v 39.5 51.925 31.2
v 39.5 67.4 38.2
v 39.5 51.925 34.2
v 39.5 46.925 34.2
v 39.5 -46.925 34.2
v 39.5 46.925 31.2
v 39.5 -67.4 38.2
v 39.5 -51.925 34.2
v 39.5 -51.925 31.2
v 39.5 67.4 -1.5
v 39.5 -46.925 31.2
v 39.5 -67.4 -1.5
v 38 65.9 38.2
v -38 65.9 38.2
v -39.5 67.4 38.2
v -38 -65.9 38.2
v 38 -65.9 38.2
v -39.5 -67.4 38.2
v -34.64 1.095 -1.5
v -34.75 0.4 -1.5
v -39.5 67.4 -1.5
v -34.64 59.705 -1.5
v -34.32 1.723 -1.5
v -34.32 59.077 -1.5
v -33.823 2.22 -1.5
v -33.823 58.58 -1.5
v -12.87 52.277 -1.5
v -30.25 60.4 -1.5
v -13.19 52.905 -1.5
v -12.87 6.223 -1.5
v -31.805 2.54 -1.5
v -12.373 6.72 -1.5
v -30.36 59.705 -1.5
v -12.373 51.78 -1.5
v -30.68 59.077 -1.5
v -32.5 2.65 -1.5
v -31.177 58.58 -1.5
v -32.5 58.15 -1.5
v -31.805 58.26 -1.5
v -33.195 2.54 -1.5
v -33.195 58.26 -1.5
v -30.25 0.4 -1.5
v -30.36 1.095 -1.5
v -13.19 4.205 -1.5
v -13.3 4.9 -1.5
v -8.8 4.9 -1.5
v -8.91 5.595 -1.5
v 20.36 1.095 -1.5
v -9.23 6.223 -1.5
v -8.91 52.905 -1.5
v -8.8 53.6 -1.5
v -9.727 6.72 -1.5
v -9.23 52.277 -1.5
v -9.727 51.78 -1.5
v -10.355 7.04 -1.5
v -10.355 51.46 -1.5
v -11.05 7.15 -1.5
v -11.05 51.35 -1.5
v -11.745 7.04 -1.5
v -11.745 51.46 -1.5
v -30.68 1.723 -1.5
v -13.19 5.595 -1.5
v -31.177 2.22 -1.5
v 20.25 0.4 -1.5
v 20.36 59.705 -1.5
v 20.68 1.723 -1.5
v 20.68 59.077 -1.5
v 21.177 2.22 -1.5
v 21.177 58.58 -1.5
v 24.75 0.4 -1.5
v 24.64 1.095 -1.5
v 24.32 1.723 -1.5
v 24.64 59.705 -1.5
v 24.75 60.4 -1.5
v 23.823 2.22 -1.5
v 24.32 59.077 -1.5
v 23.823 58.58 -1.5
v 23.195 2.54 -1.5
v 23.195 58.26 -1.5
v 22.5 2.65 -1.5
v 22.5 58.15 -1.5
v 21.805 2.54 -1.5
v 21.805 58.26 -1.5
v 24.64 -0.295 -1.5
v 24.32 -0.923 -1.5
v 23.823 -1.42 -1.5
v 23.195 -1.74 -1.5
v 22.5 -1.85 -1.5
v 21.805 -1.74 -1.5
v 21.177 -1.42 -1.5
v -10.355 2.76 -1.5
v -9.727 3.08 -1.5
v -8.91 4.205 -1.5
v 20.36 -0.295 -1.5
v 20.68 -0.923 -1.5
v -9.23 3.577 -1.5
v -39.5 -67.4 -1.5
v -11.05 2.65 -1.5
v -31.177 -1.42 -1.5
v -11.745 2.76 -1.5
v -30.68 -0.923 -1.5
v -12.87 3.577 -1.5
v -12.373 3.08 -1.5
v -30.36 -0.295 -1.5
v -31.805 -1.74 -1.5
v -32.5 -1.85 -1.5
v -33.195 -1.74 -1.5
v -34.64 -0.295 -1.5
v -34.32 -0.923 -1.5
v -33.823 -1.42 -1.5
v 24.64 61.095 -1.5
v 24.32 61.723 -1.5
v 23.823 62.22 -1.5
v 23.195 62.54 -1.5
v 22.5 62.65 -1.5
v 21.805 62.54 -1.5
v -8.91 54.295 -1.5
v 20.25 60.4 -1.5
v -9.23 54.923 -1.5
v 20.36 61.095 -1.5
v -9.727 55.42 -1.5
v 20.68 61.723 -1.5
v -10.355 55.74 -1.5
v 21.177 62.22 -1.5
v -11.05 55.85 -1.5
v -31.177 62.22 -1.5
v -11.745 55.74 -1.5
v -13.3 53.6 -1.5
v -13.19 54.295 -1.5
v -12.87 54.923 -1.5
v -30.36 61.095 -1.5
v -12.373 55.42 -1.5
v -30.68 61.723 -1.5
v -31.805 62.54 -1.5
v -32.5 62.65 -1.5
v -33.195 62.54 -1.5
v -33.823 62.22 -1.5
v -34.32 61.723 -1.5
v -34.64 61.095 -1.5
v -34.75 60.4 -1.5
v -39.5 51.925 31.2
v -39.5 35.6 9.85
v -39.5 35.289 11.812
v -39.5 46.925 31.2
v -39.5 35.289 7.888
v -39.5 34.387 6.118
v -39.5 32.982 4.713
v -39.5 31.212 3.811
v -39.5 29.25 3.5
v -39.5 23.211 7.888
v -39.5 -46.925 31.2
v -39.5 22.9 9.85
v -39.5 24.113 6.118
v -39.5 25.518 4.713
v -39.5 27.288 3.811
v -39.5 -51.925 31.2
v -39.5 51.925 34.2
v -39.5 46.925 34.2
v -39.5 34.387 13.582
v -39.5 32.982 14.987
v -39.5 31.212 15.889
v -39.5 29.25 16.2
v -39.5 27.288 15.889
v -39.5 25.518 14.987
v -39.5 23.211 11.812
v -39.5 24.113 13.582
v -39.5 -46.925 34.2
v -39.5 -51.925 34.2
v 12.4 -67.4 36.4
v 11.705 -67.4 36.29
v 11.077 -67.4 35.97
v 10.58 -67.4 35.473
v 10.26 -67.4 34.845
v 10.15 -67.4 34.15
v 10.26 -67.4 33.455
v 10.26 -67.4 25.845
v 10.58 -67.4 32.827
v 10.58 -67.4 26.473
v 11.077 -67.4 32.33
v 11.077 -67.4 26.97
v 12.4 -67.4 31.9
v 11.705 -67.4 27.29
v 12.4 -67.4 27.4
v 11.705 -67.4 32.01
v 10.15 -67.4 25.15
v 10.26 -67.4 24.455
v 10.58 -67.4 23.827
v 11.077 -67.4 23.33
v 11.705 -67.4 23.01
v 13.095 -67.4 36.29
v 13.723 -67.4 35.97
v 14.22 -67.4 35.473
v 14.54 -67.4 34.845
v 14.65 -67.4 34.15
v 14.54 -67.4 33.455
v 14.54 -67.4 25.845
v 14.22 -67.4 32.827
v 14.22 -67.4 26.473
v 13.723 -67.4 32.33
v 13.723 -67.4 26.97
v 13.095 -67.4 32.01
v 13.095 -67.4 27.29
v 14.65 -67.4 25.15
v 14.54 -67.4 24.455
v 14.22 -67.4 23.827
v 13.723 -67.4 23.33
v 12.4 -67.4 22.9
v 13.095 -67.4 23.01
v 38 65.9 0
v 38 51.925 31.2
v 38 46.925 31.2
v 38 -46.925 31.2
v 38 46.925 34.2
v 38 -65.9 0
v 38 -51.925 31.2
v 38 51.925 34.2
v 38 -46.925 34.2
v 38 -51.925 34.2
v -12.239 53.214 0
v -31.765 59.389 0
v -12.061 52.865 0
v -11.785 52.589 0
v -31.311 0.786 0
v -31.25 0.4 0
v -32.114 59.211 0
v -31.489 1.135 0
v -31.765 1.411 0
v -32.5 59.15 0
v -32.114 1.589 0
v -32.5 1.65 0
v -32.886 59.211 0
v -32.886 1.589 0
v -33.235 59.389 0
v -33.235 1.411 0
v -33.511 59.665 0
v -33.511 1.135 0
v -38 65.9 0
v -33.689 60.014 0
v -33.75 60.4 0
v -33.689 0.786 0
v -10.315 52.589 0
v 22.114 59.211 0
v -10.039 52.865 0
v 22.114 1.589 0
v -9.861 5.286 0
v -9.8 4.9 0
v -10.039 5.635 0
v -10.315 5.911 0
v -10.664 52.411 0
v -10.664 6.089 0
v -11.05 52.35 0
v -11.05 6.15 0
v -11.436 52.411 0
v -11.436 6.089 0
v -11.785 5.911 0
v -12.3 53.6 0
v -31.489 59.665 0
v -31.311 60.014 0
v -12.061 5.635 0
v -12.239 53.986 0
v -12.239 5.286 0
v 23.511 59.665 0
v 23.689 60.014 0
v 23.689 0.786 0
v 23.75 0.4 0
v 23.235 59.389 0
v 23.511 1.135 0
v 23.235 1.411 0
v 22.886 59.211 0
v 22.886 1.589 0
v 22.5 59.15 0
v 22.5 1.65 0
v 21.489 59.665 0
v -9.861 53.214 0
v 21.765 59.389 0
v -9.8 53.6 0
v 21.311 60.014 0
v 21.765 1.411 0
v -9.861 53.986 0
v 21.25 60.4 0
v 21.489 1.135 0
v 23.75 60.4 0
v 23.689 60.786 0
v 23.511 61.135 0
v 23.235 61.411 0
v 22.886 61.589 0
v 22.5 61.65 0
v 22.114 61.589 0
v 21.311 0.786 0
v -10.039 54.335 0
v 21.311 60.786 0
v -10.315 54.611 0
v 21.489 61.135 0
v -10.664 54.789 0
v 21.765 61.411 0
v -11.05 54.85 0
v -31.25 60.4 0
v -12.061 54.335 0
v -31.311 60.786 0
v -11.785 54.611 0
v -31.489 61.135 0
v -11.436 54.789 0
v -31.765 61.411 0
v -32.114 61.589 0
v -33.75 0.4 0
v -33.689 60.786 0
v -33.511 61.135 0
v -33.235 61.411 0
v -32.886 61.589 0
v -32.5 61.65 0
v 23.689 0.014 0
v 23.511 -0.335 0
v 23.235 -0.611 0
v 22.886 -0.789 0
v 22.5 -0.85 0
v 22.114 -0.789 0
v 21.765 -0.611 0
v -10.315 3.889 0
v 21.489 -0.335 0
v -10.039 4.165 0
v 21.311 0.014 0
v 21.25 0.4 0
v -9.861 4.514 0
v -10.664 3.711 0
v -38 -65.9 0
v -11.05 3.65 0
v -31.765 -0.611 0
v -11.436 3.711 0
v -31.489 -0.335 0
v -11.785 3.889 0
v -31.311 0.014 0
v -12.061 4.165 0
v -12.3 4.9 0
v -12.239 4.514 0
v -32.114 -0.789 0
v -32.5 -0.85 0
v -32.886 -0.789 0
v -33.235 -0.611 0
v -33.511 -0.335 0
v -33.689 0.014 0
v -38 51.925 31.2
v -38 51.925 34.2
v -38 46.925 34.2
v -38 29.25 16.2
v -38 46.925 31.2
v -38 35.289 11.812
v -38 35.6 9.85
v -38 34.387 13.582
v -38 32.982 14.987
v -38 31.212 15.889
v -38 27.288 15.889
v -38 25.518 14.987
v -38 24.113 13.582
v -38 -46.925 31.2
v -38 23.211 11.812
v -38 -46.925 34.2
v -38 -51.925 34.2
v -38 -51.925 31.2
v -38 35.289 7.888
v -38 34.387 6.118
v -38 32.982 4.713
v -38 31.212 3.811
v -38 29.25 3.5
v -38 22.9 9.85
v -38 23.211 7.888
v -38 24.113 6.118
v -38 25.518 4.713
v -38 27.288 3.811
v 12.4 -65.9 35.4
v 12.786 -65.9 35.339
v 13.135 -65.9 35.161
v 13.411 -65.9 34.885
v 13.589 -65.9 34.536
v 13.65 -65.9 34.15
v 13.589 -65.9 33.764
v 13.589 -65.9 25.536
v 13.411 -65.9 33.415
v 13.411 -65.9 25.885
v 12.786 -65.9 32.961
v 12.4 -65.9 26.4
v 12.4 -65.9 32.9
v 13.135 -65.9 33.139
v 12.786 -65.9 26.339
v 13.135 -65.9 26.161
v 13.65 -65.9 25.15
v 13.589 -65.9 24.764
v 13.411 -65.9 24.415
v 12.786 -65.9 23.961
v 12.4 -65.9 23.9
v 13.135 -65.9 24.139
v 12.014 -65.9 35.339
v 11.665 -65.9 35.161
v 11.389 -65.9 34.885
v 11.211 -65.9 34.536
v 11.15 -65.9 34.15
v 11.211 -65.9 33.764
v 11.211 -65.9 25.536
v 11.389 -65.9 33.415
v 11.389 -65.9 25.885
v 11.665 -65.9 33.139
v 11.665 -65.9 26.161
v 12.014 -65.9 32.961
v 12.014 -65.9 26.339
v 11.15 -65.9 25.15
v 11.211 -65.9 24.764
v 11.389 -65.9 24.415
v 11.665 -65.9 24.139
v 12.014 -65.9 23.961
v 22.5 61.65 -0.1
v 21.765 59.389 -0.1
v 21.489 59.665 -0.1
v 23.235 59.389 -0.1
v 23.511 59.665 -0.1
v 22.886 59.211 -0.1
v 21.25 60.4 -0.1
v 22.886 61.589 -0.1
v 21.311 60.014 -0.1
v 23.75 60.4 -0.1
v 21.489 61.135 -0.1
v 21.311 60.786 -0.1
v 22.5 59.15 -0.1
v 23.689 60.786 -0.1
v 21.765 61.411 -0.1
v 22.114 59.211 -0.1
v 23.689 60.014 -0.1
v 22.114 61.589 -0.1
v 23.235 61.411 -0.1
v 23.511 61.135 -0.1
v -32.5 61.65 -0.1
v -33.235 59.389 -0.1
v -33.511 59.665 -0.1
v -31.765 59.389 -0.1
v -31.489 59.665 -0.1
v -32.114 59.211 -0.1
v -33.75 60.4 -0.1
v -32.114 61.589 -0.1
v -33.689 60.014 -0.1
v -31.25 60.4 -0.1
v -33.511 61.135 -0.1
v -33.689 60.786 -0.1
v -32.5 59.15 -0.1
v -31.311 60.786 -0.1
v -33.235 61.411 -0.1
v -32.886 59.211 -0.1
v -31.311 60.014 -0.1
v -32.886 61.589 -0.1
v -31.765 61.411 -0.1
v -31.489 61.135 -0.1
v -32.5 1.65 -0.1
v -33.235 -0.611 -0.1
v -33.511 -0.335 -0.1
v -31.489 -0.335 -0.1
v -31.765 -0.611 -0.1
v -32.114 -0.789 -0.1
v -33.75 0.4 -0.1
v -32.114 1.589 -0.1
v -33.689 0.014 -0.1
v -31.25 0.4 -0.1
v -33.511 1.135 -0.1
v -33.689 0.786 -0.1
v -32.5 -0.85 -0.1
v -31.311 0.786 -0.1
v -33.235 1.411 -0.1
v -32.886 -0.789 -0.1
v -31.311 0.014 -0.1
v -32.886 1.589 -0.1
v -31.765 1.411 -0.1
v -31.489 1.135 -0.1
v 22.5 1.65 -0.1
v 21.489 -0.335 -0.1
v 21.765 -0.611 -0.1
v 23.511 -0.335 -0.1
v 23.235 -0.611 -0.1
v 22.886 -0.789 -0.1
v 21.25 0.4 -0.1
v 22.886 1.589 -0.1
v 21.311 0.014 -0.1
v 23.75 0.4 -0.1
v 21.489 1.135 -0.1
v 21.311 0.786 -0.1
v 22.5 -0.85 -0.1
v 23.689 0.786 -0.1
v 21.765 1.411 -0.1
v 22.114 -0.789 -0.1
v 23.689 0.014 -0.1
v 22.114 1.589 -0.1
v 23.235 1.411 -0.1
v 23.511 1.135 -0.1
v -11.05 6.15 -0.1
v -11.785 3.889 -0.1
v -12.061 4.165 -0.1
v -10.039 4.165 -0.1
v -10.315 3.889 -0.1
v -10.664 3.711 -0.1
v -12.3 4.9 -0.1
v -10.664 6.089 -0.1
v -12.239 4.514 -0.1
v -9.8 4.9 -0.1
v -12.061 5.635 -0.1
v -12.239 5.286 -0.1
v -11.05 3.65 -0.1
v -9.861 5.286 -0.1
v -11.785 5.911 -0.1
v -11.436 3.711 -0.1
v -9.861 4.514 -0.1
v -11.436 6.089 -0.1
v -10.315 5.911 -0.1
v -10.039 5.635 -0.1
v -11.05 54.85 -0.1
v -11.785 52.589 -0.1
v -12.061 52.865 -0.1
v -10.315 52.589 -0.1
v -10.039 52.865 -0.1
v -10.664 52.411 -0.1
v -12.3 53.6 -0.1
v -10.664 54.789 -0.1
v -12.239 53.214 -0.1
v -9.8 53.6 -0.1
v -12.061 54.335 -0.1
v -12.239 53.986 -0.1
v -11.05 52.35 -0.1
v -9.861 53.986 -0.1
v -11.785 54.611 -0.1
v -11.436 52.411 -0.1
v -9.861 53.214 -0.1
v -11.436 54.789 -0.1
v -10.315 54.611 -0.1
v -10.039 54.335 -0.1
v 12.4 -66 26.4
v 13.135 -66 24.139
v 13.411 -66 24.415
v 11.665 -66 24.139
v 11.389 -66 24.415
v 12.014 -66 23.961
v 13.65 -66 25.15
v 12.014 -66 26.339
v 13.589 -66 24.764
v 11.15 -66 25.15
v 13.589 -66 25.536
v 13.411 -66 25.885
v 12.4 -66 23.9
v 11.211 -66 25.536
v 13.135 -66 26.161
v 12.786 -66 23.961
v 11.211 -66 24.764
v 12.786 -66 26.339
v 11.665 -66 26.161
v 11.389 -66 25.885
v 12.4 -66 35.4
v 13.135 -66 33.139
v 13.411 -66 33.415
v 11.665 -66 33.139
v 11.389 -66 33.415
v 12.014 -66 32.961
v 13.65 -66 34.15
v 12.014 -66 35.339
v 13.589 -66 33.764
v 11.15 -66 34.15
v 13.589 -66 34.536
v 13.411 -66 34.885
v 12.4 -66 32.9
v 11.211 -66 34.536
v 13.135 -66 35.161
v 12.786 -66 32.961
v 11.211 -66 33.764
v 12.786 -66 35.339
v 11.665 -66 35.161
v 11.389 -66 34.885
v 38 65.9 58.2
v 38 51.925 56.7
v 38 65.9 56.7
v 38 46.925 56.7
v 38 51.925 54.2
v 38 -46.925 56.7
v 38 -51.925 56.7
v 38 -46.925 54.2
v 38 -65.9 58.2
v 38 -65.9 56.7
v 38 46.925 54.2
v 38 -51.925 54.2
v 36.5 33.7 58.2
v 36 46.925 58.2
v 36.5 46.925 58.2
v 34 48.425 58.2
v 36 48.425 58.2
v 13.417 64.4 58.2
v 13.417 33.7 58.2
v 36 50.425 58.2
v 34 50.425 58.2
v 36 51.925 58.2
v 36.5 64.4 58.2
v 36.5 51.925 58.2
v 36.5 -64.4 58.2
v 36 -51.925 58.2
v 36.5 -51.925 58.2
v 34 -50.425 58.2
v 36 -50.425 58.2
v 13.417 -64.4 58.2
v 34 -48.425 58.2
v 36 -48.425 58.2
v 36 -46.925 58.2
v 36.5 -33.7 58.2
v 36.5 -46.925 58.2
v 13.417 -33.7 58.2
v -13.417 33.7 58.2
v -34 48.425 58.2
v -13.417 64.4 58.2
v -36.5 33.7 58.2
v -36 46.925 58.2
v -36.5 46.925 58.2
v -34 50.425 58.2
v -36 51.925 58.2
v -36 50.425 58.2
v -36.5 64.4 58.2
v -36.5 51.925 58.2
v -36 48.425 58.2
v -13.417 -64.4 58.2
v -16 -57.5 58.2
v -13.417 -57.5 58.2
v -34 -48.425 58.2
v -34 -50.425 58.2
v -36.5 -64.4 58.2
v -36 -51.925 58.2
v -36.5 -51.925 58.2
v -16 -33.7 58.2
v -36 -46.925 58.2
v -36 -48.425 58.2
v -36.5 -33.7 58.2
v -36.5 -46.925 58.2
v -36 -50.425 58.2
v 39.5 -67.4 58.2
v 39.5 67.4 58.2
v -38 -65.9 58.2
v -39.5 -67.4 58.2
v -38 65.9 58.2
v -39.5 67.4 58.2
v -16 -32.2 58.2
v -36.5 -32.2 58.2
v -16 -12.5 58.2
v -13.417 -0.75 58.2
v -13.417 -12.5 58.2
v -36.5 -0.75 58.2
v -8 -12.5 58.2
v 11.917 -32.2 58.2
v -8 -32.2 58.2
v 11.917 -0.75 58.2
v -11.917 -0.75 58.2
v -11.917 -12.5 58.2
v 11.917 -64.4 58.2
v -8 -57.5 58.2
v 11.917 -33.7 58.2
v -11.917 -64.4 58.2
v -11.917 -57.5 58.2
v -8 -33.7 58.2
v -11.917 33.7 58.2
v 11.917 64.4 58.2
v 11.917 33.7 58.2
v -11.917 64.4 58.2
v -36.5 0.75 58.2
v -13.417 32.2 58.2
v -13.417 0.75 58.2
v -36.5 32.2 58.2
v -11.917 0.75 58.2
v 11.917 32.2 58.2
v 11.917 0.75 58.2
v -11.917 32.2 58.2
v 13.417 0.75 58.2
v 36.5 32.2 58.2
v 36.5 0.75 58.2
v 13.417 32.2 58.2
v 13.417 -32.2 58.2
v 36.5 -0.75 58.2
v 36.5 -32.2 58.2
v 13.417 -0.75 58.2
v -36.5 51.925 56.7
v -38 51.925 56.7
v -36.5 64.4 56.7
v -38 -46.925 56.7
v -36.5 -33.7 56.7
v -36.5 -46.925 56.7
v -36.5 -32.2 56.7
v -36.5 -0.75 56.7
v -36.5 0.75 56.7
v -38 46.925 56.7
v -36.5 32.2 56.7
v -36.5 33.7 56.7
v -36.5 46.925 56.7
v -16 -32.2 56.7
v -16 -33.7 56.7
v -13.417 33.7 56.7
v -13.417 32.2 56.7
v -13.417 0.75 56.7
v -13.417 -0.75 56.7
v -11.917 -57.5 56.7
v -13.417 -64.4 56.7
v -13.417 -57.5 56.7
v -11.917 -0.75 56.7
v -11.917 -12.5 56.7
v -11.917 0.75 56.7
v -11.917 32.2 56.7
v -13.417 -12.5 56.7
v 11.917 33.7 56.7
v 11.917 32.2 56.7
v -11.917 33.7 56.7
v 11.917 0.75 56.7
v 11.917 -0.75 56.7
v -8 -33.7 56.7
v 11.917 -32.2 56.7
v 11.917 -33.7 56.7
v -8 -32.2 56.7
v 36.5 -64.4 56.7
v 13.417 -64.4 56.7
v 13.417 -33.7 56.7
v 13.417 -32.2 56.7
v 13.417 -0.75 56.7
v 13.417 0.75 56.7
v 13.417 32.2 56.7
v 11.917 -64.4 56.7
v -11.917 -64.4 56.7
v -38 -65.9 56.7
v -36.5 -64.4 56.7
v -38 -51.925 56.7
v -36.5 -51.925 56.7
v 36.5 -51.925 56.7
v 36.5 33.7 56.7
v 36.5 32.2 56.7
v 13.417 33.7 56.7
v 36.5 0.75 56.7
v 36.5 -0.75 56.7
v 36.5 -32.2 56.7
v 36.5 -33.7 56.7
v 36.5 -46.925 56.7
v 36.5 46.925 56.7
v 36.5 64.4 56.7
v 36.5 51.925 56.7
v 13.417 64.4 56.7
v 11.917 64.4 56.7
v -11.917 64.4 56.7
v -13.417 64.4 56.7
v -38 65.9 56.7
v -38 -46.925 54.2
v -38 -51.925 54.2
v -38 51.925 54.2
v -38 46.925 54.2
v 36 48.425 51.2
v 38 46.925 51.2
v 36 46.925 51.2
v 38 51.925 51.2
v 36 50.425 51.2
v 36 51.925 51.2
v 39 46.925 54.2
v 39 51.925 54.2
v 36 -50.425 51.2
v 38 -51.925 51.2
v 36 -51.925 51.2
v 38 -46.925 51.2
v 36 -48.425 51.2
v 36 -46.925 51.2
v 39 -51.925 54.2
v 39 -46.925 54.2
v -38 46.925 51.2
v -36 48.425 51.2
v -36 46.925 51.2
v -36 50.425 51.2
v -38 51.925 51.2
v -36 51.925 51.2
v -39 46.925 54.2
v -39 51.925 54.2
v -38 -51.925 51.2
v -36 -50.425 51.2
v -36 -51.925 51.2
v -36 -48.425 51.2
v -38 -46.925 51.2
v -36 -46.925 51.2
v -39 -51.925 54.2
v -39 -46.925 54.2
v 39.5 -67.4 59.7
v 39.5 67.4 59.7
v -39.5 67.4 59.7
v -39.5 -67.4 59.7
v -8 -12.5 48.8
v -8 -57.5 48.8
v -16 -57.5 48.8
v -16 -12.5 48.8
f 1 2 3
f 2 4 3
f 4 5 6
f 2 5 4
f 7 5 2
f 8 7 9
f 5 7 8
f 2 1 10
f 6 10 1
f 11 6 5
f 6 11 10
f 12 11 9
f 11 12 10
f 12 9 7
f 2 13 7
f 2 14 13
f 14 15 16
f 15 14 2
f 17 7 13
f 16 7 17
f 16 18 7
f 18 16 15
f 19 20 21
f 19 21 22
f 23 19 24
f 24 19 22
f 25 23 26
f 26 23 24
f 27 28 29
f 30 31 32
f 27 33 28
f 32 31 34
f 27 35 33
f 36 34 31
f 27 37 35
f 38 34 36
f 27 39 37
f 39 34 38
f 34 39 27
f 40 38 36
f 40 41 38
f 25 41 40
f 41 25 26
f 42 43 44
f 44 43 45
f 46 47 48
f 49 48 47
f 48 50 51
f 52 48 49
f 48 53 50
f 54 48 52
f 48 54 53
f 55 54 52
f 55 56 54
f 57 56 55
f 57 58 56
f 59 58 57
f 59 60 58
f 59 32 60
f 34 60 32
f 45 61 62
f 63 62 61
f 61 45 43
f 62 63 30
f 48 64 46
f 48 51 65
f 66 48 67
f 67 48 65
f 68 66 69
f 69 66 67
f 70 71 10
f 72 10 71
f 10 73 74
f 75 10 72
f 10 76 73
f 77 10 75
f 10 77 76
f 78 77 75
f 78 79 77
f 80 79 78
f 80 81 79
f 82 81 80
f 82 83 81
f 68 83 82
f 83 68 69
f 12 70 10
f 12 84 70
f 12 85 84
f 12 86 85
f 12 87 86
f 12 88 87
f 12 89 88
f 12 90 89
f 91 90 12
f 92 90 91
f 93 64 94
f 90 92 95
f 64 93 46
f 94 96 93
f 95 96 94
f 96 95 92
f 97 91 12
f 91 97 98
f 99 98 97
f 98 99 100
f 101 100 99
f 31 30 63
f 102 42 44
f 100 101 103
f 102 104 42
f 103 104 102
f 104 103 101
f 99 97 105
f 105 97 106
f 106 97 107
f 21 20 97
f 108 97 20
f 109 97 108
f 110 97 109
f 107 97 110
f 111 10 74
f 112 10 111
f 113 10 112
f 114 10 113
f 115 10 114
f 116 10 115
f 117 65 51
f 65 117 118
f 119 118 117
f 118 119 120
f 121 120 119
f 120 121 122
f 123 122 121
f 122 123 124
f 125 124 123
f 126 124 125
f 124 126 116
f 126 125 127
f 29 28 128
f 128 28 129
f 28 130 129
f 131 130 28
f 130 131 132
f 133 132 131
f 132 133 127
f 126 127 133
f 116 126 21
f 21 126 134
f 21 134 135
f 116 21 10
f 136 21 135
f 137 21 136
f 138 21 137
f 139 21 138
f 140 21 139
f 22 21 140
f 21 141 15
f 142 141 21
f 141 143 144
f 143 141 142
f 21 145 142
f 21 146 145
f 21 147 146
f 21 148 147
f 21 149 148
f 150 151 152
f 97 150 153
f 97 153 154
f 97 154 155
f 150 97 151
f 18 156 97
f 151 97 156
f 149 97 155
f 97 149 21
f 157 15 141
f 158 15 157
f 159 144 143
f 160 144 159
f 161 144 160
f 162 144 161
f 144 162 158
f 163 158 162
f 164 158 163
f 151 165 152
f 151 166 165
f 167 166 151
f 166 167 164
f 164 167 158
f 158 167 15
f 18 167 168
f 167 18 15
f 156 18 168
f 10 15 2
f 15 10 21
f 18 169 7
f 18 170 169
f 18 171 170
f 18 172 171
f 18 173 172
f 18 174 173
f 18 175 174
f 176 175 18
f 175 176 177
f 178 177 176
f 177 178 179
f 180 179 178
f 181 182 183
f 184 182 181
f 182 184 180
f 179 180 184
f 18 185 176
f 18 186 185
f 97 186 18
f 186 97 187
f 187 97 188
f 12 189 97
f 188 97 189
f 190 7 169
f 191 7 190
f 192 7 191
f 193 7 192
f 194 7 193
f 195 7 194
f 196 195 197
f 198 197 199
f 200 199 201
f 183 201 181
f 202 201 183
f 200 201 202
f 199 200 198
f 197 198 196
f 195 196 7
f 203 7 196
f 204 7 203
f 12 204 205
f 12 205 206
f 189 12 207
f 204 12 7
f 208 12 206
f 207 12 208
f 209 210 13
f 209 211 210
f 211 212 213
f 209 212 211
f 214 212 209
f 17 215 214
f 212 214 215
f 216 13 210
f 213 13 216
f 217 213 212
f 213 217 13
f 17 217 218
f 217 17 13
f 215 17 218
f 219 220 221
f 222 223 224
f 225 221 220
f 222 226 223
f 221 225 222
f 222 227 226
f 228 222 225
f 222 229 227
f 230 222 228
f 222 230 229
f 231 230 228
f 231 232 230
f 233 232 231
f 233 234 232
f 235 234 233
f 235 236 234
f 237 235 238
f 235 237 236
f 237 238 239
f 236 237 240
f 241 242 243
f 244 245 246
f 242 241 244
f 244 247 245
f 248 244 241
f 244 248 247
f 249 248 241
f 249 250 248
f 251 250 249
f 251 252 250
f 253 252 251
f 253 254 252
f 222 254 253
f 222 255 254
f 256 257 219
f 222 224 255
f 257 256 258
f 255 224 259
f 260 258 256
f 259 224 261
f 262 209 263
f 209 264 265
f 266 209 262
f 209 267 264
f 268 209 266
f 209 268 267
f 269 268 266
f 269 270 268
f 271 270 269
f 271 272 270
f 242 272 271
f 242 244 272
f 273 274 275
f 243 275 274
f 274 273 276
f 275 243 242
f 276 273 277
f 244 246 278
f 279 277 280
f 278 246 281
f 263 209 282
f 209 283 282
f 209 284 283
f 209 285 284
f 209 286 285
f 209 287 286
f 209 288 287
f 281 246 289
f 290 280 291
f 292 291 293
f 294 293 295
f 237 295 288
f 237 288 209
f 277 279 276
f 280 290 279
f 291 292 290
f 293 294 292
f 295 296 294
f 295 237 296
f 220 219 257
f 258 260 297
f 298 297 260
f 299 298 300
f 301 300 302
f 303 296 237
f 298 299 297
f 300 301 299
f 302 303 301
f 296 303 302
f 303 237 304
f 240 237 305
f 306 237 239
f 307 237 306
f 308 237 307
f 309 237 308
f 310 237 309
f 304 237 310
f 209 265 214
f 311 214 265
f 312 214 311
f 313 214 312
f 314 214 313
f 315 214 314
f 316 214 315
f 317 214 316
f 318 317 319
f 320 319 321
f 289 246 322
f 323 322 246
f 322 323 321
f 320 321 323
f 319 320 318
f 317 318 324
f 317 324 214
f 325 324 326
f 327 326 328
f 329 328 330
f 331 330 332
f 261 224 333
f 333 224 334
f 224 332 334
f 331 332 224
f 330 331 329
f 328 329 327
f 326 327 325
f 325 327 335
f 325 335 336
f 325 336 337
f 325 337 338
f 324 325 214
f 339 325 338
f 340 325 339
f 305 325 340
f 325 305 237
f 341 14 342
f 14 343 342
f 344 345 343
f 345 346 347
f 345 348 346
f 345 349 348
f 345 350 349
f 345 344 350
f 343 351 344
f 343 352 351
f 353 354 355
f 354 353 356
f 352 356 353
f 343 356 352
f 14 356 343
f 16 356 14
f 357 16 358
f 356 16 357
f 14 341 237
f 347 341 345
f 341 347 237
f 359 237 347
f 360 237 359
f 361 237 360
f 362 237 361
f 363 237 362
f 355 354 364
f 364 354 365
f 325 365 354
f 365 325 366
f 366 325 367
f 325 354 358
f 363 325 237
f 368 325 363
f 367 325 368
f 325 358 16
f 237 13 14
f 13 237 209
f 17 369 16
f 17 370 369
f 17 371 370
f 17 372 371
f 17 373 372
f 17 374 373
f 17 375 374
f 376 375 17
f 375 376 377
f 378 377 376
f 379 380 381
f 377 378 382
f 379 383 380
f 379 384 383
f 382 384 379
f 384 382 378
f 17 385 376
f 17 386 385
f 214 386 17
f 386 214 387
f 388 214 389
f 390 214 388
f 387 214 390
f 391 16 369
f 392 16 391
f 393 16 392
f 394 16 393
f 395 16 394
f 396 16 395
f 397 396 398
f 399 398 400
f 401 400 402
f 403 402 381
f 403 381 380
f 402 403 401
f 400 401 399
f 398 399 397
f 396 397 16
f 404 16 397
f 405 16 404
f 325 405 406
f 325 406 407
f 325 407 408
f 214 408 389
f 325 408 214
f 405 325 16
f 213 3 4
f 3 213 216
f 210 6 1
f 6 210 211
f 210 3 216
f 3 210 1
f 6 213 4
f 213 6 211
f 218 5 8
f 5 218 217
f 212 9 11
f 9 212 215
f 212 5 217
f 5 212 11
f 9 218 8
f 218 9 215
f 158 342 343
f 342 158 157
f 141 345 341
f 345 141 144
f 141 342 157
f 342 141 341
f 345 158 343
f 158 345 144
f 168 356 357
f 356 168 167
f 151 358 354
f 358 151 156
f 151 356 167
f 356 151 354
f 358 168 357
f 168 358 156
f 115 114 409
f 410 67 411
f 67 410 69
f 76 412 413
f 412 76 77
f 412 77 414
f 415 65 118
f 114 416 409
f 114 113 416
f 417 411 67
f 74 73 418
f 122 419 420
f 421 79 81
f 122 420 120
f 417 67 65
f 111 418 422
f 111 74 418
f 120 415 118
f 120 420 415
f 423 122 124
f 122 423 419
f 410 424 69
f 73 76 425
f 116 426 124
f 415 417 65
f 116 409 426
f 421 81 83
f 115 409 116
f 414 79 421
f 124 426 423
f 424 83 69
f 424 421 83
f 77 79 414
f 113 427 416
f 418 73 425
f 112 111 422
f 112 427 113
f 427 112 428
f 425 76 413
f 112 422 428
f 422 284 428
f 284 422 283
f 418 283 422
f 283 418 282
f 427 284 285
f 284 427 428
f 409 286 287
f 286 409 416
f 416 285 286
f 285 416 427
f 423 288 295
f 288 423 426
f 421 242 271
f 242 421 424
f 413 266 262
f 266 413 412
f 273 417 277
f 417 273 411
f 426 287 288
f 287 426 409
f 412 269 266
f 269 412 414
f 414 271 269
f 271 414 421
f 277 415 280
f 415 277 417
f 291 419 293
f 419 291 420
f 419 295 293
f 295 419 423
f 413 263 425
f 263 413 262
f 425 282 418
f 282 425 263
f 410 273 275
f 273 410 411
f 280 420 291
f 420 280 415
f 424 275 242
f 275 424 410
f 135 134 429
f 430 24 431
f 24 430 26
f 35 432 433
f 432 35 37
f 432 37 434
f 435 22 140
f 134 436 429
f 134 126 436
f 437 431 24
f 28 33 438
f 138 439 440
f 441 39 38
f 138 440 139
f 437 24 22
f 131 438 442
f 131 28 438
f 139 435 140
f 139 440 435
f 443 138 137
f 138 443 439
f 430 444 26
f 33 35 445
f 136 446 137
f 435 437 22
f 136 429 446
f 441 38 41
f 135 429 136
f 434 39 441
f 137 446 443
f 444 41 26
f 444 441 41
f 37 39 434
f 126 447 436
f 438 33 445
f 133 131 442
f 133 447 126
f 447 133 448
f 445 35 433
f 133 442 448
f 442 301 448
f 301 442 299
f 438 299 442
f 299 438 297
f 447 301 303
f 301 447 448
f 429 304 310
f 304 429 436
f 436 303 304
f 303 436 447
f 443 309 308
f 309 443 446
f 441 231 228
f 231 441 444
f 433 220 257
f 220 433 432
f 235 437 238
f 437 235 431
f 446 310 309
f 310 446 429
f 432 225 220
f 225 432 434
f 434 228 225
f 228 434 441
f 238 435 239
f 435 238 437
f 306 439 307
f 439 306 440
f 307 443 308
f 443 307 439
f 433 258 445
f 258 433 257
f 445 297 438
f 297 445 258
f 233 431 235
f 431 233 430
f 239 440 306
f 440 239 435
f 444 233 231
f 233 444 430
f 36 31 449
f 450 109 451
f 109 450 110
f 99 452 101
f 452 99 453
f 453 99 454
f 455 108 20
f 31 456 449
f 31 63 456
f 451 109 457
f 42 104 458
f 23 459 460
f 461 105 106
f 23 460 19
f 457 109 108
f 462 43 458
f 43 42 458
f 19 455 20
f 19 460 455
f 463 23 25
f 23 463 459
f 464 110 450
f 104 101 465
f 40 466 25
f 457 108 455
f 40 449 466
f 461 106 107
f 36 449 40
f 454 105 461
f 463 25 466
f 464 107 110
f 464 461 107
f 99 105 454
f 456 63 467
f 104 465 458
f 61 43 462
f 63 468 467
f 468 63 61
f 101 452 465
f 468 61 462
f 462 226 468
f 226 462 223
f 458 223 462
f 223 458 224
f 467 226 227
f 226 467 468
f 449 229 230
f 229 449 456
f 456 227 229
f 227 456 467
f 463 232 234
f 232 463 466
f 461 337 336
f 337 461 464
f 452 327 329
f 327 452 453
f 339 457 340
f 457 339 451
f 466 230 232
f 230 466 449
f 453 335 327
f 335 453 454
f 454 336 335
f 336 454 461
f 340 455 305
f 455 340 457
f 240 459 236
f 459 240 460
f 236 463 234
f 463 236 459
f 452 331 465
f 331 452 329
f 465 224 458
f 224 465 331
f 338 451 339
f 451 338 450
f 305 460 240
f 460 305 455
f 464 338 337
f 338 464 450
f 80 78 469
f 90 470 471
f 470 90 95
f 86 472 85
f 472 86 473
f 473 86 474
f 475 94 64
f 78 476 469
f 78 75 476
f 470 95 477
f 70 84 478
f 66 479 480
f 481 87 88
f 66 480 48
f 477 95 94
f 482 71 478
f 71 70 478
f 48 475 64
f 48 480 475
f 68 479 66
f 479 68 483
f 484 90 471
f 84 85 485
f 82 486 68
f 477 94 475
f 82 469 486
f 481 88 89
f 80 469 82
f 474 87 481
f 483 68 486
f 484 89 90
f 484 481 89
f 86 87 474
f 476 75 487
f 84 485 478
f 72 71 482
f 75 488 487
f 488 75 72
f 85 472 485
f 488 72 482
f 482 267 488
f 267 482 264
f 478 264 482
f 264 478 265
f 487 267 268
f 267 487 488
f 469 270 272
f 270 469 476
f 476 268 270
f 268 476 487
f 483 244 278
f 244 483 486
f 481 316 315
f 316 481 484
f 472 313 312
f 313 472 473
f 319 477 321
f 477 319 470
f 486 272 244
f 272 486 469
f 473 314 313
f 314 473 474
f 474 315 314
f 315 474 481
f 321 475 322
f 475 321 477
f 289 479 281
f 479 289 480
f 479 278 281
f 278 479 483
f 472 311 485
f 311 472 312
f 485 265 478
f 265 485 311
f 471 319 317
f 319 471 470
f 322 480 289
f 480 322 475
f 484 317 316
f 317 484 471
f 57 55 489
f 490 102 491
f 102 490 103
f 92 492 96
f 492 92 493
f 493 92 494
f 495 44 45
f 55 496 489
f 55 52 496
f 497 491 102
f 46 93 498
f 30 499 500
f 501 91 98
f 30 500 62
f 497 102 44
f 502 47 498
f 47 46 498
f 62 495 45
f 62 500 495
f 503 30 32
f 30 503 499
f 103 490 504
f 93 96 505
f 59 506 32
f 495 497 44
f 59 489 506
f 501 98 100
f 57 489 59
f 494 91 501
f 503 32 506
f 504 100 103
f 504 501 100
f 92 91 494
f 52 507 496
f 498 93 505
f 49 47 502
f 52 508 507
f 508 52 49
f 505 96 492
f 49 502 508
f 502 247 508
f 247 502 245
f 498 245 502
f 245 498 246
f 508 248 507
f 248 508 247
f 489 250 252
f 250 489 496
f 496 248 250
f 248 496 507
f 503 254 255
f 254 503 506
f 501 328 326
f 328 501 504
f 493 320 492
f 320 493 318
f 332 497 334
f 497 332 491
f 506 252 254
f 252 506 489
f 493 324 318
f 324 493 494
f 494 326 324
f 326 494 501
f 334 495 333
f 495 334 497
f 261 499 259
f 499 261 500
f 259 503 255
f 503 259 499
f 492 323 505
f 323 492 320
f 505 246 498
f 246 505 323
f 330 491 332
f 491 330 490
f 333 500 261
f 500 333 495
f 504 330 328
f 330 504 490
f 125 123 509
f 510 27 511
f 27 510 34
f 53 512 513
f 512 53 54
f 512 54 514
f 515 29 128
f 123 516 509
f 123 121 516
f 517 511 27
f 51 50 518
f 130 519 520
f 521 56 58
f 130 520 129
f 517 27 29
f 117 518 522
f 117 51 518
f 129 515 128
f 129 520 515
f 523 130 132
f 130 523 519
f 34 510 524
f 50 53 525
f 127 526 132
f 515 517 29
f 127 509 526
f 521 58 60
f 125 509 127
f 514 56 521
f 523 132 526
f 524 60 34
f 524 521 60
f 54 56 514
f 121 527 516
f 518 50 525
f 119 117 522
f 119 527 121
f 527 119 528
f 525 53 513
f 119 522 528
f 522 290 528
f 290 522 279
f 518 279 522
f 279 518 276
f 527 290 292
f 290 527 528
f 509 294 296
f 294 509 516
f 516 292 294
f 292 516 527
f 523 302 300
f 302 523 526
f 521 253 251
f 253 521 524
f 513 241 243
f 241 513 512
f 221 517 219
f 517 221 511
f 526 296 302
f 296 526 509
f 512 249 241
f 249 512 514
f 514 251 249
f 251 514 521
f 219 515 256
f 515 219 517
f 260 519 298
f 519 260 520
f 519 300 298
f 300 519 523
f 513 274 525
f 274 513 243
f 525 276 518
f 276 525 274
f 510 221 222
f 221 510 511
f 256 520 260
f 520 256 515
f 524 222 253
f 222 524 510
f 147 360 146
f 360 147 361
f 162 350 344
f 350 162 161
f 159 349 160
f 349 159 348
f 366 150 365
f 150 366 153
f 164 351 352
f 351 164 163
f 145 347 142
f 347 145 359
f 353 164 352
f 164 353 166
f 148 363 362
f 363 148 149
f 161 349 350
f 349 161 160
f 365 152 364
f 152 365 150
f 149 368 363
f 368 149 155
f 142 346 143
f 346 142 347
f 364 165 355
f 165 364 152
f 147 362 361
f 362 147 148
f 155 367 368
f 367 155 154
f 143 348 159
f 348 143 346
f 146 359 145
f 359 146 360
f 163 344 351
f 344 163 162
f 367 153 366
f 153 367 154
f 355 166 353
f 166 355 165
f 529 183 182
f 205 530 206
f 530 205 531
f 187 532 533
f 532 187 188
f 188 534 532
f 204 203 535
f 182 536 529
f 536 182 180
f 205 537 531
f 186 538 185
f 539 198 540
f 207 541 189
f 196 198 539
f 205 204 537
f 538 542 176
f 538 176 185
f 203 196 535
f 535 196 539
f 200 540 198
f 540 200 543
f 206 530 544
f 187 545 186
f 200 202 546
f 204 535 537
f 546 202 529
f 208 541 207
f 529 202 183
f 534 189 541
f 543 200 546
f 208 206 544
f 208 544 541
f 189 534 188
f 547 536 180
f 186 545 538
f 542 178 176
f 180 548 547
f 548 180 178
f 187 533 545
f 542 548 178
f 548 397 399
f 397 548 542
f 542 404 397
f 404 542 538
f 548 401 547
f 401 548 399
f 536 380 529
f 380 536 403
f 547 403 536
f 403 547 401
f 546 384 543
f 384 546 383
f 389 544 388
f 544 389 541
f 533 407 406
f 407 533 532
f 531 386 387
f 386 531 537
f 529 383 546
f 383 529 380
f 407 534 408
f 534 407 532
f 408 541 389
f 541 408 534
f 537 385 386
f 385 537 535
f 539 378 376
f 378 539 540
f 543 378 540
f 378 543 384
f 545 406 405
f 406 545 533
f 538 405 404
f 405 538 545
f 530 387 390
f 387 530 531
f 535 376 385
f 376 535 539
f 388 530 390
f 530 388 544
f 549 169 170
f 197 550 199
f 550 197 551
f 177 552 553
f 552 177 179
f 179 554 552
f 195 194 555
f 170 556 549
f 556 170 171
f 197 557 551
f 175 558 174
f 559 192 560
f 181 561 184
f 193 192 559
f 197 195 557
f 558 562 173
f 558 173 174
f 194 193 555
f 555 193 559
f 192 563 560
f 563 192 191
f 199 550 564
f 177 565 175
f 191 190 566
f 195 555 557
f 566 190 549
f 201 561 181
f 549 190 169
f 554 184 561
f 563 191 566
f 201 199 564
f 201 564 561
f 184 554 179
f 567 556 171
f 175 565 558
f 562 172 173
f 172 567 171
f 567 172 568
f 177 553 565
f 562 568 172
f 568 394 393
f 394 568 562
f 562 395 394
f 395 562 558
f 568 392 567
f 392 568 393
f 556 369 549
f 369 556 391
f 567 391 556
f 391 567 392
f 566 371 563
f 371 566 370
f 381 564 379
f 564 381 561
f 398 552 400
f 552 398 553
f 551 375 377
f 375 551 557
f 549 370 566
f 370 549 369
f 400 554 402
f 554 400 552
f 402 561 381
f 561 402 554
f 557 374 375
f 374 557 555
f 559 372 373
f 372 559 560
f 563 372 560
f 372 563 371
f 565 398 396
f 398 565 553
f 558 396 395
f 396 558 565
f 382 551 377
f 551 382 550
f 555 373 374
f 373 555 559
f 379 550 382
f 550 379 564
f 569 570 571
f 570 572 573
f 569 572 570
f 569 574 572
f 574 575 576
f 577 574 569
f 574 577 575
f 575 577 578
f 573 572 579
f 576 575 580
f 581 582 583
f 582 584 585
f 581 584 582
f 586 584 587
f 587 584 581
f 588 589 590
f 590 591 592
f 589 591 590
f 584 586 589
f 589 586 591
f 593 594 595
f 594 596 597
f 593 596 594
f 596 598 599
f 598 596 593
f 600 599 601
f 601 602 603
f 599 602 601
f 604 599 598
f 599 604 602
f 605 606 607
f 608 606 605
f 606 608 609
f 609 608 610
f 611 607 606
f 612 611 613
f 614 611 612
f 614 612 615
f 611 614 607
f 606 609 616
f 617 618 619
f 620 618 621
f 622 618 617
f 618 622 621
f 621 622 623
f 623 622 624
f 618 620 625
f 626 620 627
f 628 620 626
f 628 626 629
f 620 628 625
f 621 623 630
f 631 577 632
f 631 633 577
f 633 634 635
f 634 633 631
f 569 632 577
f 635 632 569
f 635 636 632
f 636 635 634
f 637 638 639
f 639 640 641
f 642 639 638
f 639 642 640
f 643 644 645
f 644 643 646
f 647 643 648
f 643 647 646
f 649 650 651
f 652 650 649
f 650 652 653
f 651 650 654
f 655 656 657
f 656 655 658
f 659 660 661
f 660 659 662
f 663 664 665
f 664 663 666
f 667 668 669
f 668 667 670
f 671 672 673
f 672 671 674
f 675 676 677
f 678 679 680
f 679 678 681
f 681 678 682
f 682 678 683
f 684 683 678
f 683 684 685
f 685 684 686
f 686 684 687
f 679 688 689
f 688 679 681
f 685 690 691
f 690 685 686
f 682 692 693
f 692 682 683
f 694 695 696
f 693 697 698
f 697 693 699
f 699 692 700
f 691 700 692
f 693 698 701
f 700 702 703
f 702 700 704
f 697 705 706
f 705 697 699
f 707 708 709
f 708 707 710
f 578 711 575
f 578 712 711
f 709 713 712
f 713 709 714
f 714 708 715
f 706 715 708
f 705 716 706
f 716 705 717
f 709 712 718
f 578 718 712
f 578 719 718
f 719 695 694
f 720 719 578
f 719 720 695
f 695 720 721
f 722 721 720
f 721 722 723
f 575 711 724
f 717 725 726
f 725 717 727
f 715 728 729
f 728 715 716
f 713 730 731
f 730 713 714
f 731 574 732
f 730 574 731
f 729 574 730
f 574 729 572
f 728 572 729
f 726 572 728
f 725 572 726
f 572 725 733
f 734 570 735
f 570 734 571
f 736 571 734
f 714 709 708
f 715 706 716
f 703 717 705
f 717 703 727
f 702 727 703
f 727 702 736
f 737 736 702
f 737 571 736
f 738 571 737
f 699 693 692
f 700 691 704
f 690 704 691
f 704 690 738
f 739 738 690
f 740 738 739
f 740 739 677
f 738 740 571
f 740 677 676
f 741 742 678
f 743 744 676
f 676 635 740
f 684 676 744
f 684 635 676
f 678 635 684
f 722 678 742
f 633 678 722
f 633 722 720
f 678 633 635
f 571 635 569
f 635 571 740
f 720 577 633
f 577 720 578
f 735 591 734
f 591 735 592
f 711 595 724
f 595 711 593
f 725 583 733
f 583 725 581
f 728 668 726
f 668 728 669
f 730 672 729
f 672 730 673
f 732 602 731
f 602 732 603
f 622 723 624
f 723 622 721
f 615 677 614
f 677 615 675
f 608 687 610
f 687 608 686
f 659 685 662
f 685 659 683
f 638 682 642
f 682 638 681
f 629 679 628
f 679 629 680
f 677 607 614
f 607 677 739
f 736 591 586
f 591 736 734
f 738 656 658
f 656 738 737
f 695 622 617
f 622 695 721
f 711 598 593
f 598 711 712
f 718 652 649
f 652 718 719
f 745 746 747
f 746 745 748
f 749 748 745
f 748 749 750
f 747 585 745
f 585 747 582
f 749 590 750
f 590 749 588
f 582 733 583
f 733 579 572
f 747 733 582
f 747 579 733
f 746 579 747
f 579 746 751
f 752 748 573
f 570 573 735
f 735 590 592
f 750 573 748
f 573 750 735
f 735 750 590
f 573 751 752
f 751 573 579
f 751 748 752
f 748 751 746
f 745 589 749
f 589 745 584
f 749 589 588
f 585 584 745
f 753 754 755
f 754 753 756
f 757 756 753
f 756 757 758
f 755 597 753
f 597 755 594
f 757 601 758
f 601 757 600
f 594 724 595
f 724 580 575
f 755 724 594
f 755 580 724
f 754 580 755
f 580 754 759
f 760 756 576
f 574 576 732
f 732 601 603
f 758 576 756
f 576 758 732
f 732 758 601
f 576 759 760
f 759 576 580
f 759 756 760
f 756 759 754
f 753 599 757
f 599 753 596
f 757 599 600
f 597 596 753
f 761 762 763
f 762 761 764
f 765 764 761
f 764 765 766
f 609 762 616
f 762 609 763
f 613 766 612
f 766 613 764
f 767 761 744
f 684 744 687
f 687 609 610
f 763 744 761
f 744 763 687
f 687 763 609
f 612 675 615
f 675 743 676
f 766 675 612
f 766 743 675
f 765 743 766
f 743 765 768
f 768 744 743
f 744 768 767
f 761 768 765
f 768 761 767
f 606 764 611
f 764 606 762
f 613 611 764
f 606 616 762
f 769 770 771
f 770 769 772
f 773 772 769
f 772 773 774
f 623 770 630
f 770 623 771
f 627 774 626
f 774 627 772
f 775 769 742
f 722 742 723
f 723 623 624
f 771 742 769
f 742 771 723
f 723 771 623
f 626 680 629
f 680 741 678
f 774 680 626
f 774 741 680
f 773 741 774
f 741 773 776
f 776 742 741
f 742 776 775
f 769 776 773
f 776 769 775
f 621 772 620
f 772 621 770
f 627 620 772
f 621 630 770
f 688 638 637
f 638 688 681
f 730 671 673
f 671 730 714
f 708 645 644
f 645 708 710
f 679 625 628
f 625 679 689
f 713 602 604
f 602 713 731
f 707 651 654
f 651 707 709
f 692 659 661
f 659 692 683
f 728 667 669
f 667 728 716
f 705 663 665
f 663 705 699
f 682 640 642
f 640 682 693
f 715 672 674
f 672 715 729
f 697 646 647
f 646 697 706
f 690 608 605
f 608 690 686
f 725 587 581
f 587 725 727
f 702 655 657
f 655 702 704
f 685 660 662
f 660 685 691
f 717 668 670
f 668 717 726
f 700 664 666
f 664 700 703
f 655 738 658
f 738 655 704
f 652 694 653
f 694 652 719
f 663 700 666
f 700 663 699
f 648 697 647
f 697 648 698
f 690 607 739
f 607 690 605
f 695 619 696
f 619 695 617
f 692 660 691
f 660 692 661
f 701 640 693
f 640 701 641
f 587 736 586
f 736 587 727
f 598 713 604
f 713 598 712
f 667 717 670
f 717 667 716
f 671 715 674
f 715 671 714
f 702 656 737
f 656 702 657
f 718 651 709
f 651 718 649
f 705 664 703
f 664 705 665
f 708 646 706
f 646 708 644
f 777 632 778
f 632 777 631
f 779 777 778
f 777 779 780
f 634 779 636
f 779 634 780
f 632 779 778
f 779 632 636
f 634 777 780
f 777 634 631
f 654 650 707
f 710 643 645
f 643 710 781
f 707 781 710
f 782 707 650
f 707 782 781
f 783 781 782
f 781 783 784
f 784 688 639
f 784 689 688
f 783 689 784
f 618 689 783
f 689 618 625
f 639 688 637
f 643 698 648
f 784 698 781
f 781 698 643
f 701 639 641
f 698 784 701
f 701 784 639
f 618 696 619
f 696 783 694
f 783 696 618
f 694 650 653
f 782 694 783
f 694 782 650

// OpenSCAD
// CAD script for the case and lid of the OpenWindow enclosure

// Dimensions of the items contained within the enclosure
// OpenWindow PCB
pcb_length = 65;
pcb_width = 70;
pcb_height = 1;
pcb_hole_diameter = 2.5;
pcb_hole_inset = 5;
// Incoming connections terminal block
terminalblock_length = 23.4;
terminalblock_width = 67.7;
terminalblock_height = 16.2;
terminalblock_hole_diameter = 3.5;
terminalblock_hole_inset = 9.5;
// Relays
relays_length = 52.9;
relays_width = 60.8;
relays_height = 30.8;
// Current measurement PCB
current_pcb_length = 31.5;
current_pcb_width = 13.1;
current_pcb_height = 1;
current_pcb_hole_offset_length = 17;
current_pcb_hole_offset_width = 2.9/2 + 0.6;
current_pcb_hole_diameter = 2.5;

// Main box dimensions
pcb_standoff_height = terminalblock_height + 2;
box_contents_padding = 0.5;
box_length = pcb_length + 2 * box_contents_padding + 10;
box_width = pcb_width +relays_width + 2*box_contents_padding;
box_height = 20 + pcb_standoff_height;
box_wall_thickness = 1.5;

// Relay support block on the box lid
box_lid_relay_support_length = 8;
box_lid_relay_support_width = 45;
box_lid_relay_support_height = box_height - relays_height + 2;
box_lid_relay_support_offset = 22;

// Cable entry grommet dimensions
grommet_diameter = 12.7;
grommet_height = grommet_diameter/2 + 5;

// Lid cantilever clip dimensions
clip_length = 7;
clip_hook_length = 3;
clip_thickness = 2;
clip_width = 5;
clip_spine_width = 2;
clip_spine_depth = 2;
clip_depth = 1;

// This module generates its children in the positions of the main PCB mounting holes
module pcb_holes(){
    pcb_hole_locations = [[pcb_length / 2 - pcb_hole_inset, pcb_width / 2 - pcb_hole_inset, 0],
               [-(pcb_length / 2 - pcb_hole_inset), pcb_width / 2 - pcb_hole_inset, 0],
               [-(pcb_length / 2 - pcb_hole_inset), -(pcb_width / 2 - pcb_hole_inset), 0],
               [pcb_length / 2 - pcb_hole_inset, -(pcb_width / 2 - pcb_hole_inset), 0]];
    
    for(i=pcb_hole_locations){
        translate(i){
            children();
        }
    }
    
}

// This module approximates the main PCB, for testing fit in the box
module pcb(show_board = true){
    union(){
        difference(){
            cube([pcb_length, pcb_width, pcb_height], center=true);
            pcb_holes(){
                cylinder(d = pcb_hole_diameter, h = pcb_height * 3, center=true, $fn=10);
            }
        }
    }
}

// This module generates its children in the positions of the current measurement PCB mounting holes
module current_pcb_holes(){
    for(i = [-current_pcb_width/2 + current_pcb_hole_offset_width, current_pcb_width/2 - current_pcb_hole_offset_width]){
        translate([current_pcb_length/2 - current_pcb_hole_offset_length, i, 0]){
            children();
        }
    }
}

// This module approximates the current measurement PCB, for testing fit in the box
module current_pcb(){
    difference(){
        cube([current_pcb_length, current_pcb_width, current_pcb_height], center=true);
        
        current_pcb_holes(){
            cylinder(d=current_pcb_hole_diameter, h=10, center=true, $fn=20);
        }
    }
}

// This module generates its children in the positions of the terminal block mounting holes
module terminalblock_holes(){
    for(i=[-(terminalblock_width/2 - terminalblock_hole_inset), terminalblock_width/2 - terminalblock_hole_inset]){
        translate([0, i, 0])
        {
            children();
        }
    }
}

// This module approximates the terminal block, for testing fit in the box
module terminalblock(){
    difference(){
        cube([terminalblock_length, terminalblock_width, terminalblock_height], center=true);
        
        terminalblock_holes(){
            cylinder(d=terminalblock_hole_diameter, h=2*terminalblock_height, center=true, $fn=10);
        }
    }
}

// This module approximates the relays, for testing fit in the box
module relays(){
    translate([relays_length/2, relays_width/2, relays_height/2]){
        cube([relays_length, relays_width, relays_height], center=true);
    }
}

// Triangular prism module for use creating the cantilever clips
// from https://en.wikibooks.org/wiki/OpenSCAD_User_Manual/Primitive_Solids#polyhedron
module triangular_prism(l, w, h){
   polyhedron(
           points=[[0,0,0], [l,0,0], [l,w,0], [0,w,0], [0,w,h], [l,w,h]],
           faces=[[0,1,2,3],[5,4,3,2],[0,4,5,1],[0,3,4],[5,2,1]]
   );
}

// This module generates a cantilever clip, as used on the enclosure lid
module clip(with_spine = true){
    union(){
        cube([clip_thickness, clip_width, clip_length], center=true);
        
        translate([clip_depth, 0, clip_length/2 - clip_hook_length / 2]){
            rotate([0, 0, 90]){
                translate([-clip_width/2, -clip_thickness/2, -clip_hook_length/2]){
                    triangular_prism(clip_width, clip_depth, clip_hook_length);
                }
            }
        }
        if(with_spine){
            translate([ - clip_spine_depth, 0, 0]){
                rotate([0, 0, -90]){
                    translate([-clip_spine_width/2, -clip_thickness/2, -clip_length/2]){
                        triangular_prism(clip_spine_width, clip_spine_depth, clip_length);
                    }
                }
            }
        }
    }
}

// This module generates a hole and countersink for an m2.5 bolt
module bolt_m25(){
    countersink_depth = 1.4;
    diameter = 2.5;
    union(){
        rotate_extrude(angle=360, $fn=20){
            polygon([[0,0], [0, countersink_depth], [diameter/2, countersink_depth], [2.25, 0]]);
        }
        translate([0, 0, countersink_depth/2]){
            cylinder(r=diameter/2, h=20, $fn=20);
            
        }
    }
}

// This module generates the body of the box, without mounting holes
module box_border(){
    translate([0, 0, box_height/2]){
        difference(){
            
            // Hollowed out box
            union(){
                difference(){
                    translate([0,0,-box_wall_thickness/2]){
                        // Expand length and width by 2x wall, but height by only 1x as lid is separate 
                        cube([box_length + 2*box_wall_thickness, box_width + 2*box_wall_thickness, box_height + box_wall_thickness], center=true);
                    }
                    translate([0, 0, box_wall_thickness]){
                        cube([box_length, box_width, box_height + box_wall_thickness * 2], center=true);
                    }
                }
            }
        
            // Clip holes
            clip_hole_size = [box_wall_thickness * 3,clip_width, clip_hook_length];
            
            translate([0,0,box_height/2-(clip_length - clip_hook_length) - clip_hook_length/2]){
                translate([box_length/2,0, 0]){
                    translate([0, 3 * box_width/8, 0]){
                        cube(clip_hole_size, center=true);
                    }
                    translate([0, -3 * box_width/8, 0]){
                        cube(clip_hole_size, center=true);
                    }
                }
                mirror([1, 0, 0]){
                    translate([box_length/2,0, 0]){
                        translate([0, 3 * box_width/8, 0]){
                            cube(clip_hole_size, center=true);
                        }
                        translate([0, -3 * box_width/8, 0]){
                            cube(clip_hole_size, center=true);
                        }
                    }
                }
            }
        }
    }
}

// This module generates the lid for the enclosure
module box_lid(){
    union(){
        cube([box_length + 2*box_wall_thickness, box_width + 2*box_wall_thickness, box_wall_thickness], center=true);
        
        // Lid lip
        translate([0, 0, -box_wall_thickness]){
            difference(){
                cube([box_length, box_width, box_wall_thickness], center=true);
                cube([box_length - 2*box_wall_thickness, box_width - 2*box_wall_thickness, 2*box_wall_thickness], center=true);
            }
        }
        // Lid clips
        translate([0,0,-clip_length/2 - box_wall_thickness / 2]){
            translate([box_length/2 - clip_thickness / 2,0, 0]){
                translate([0, 3 * box_width/8, 0]){
                    rotate([180, 0, 0]){
                        clip();
                    }
                }
                translate([0, -3 * box_width/8, 0]){
                    rotate([180, 0, 0]){
                        clip();
                    }
                }
            }
            mirror([1, 0, 0]){
                translate([box_length/2 - clip_thickness / 2,0, 0]){
                    translate([0, 3 * box_width/8, 0]){
                        rotate([180, 0, 0]){
                            clip();
                        }
                    }
                    translate([0, -3 * box_width/8, 0]){
                        rotate([180, 0, 0]){
                            clip();
                        }
                    }
                }
            }
        }
        
        // Relay support block
        translate([-box_length/2 + box_lid_relay_support_length/2 + box_lid_relay_support_offset, -box_width/2 + relays_width/2 +box_contents_padding, -box_lid_relay_support_height/2 - box_wall_thickness/2]){
            cube([box_lid_relay_support_length, box_lid_relay_support_width, box_lid_relay_support_height], center=true);
        }
        
        // Strengthening ribs
        translate([0, 0, -box_wall_thickness]){
            for(i =[-box_width/4, 0, box_width/4]){
                translate([0, i, 0]){
                    cube([box_length, box_wall_thickness, box_wall_thickness], center=true);
                }
            }
            
            for(i =[-box_length/6, box_length/6]){
                translate([i, 0, 0]){
                    cube([box_wall_thickness, box_width, box_wall_thickness], center=true);
                }
            }
        }
    }
}

// This module generates the main body of the enclosure, by adding the bolt holes and cable entry hole
// to the box_border module
module box(){
    difference(){
        box_border();
        translate([-box_length/2 + box_contents_padding, -box_width/2 + box_contents_padding, 0]){
            translate([0, relays_width, -box_wall_thickness]){
                // Countersunk bolt holes for PCB and terminal block
                translate([pcb_length/2, pcb_width/2, 0]){
                    pcb_holes(){
                        bolt_m25();
                    }
                }
                translate([relays_length / 2, terminalblock_width/2, 0]){
                    terminalblock_holes(){
                        bolt_m25();
                    }
                    
                    // Cable entry hole
                    translate([0, 0, grommet_height]){
                        rotate([0, 90, 0]){
                            cylinder(d=grommet_diameter, h=box_width/2, center=true);
                        }
                    }
                }
            }
            translate([current_pcb_length/2 + relays_length - 20, -current_pcb_height/2 - box_wall_thickness, box_height - current_pcb_width/2 -box_wall_thickness - 0.5]){
                rotate([-90, 180, 0]){
                    current_pcb_holes(){
                        bolt_m25();
                    }
                }
            }
        }
    }
}


// Draw box and lid
box();

translate([0, 0, box_height + box_wall_thickness/2 + 20]){
    box_lid();
}

// Box contents, to demonstrate fit
if(false){
    translate([-box_length/2 + box_contents_padding, -box_width/2 + box_contents_padding, 0]){
        relays();
        translate([0, relays_width, 0]){
            translate([pcb_length/2, pcb_width/2, pcb_standoff_height + pcb_height/2]){
                pcb();
            }
            translate([relays_length / 2, terminalblock_width/2, terminalblock_height/2]){
                terminalblock();
            }
        }
        translate([current_pcb_length/2 + relays_length - 20, 0, box_height - current_pcb_width/2 -box_wall_thickness - 0.5]){
            rotate([90, 180, 0]){
                current_pcb();
            }
        }
    }
}
